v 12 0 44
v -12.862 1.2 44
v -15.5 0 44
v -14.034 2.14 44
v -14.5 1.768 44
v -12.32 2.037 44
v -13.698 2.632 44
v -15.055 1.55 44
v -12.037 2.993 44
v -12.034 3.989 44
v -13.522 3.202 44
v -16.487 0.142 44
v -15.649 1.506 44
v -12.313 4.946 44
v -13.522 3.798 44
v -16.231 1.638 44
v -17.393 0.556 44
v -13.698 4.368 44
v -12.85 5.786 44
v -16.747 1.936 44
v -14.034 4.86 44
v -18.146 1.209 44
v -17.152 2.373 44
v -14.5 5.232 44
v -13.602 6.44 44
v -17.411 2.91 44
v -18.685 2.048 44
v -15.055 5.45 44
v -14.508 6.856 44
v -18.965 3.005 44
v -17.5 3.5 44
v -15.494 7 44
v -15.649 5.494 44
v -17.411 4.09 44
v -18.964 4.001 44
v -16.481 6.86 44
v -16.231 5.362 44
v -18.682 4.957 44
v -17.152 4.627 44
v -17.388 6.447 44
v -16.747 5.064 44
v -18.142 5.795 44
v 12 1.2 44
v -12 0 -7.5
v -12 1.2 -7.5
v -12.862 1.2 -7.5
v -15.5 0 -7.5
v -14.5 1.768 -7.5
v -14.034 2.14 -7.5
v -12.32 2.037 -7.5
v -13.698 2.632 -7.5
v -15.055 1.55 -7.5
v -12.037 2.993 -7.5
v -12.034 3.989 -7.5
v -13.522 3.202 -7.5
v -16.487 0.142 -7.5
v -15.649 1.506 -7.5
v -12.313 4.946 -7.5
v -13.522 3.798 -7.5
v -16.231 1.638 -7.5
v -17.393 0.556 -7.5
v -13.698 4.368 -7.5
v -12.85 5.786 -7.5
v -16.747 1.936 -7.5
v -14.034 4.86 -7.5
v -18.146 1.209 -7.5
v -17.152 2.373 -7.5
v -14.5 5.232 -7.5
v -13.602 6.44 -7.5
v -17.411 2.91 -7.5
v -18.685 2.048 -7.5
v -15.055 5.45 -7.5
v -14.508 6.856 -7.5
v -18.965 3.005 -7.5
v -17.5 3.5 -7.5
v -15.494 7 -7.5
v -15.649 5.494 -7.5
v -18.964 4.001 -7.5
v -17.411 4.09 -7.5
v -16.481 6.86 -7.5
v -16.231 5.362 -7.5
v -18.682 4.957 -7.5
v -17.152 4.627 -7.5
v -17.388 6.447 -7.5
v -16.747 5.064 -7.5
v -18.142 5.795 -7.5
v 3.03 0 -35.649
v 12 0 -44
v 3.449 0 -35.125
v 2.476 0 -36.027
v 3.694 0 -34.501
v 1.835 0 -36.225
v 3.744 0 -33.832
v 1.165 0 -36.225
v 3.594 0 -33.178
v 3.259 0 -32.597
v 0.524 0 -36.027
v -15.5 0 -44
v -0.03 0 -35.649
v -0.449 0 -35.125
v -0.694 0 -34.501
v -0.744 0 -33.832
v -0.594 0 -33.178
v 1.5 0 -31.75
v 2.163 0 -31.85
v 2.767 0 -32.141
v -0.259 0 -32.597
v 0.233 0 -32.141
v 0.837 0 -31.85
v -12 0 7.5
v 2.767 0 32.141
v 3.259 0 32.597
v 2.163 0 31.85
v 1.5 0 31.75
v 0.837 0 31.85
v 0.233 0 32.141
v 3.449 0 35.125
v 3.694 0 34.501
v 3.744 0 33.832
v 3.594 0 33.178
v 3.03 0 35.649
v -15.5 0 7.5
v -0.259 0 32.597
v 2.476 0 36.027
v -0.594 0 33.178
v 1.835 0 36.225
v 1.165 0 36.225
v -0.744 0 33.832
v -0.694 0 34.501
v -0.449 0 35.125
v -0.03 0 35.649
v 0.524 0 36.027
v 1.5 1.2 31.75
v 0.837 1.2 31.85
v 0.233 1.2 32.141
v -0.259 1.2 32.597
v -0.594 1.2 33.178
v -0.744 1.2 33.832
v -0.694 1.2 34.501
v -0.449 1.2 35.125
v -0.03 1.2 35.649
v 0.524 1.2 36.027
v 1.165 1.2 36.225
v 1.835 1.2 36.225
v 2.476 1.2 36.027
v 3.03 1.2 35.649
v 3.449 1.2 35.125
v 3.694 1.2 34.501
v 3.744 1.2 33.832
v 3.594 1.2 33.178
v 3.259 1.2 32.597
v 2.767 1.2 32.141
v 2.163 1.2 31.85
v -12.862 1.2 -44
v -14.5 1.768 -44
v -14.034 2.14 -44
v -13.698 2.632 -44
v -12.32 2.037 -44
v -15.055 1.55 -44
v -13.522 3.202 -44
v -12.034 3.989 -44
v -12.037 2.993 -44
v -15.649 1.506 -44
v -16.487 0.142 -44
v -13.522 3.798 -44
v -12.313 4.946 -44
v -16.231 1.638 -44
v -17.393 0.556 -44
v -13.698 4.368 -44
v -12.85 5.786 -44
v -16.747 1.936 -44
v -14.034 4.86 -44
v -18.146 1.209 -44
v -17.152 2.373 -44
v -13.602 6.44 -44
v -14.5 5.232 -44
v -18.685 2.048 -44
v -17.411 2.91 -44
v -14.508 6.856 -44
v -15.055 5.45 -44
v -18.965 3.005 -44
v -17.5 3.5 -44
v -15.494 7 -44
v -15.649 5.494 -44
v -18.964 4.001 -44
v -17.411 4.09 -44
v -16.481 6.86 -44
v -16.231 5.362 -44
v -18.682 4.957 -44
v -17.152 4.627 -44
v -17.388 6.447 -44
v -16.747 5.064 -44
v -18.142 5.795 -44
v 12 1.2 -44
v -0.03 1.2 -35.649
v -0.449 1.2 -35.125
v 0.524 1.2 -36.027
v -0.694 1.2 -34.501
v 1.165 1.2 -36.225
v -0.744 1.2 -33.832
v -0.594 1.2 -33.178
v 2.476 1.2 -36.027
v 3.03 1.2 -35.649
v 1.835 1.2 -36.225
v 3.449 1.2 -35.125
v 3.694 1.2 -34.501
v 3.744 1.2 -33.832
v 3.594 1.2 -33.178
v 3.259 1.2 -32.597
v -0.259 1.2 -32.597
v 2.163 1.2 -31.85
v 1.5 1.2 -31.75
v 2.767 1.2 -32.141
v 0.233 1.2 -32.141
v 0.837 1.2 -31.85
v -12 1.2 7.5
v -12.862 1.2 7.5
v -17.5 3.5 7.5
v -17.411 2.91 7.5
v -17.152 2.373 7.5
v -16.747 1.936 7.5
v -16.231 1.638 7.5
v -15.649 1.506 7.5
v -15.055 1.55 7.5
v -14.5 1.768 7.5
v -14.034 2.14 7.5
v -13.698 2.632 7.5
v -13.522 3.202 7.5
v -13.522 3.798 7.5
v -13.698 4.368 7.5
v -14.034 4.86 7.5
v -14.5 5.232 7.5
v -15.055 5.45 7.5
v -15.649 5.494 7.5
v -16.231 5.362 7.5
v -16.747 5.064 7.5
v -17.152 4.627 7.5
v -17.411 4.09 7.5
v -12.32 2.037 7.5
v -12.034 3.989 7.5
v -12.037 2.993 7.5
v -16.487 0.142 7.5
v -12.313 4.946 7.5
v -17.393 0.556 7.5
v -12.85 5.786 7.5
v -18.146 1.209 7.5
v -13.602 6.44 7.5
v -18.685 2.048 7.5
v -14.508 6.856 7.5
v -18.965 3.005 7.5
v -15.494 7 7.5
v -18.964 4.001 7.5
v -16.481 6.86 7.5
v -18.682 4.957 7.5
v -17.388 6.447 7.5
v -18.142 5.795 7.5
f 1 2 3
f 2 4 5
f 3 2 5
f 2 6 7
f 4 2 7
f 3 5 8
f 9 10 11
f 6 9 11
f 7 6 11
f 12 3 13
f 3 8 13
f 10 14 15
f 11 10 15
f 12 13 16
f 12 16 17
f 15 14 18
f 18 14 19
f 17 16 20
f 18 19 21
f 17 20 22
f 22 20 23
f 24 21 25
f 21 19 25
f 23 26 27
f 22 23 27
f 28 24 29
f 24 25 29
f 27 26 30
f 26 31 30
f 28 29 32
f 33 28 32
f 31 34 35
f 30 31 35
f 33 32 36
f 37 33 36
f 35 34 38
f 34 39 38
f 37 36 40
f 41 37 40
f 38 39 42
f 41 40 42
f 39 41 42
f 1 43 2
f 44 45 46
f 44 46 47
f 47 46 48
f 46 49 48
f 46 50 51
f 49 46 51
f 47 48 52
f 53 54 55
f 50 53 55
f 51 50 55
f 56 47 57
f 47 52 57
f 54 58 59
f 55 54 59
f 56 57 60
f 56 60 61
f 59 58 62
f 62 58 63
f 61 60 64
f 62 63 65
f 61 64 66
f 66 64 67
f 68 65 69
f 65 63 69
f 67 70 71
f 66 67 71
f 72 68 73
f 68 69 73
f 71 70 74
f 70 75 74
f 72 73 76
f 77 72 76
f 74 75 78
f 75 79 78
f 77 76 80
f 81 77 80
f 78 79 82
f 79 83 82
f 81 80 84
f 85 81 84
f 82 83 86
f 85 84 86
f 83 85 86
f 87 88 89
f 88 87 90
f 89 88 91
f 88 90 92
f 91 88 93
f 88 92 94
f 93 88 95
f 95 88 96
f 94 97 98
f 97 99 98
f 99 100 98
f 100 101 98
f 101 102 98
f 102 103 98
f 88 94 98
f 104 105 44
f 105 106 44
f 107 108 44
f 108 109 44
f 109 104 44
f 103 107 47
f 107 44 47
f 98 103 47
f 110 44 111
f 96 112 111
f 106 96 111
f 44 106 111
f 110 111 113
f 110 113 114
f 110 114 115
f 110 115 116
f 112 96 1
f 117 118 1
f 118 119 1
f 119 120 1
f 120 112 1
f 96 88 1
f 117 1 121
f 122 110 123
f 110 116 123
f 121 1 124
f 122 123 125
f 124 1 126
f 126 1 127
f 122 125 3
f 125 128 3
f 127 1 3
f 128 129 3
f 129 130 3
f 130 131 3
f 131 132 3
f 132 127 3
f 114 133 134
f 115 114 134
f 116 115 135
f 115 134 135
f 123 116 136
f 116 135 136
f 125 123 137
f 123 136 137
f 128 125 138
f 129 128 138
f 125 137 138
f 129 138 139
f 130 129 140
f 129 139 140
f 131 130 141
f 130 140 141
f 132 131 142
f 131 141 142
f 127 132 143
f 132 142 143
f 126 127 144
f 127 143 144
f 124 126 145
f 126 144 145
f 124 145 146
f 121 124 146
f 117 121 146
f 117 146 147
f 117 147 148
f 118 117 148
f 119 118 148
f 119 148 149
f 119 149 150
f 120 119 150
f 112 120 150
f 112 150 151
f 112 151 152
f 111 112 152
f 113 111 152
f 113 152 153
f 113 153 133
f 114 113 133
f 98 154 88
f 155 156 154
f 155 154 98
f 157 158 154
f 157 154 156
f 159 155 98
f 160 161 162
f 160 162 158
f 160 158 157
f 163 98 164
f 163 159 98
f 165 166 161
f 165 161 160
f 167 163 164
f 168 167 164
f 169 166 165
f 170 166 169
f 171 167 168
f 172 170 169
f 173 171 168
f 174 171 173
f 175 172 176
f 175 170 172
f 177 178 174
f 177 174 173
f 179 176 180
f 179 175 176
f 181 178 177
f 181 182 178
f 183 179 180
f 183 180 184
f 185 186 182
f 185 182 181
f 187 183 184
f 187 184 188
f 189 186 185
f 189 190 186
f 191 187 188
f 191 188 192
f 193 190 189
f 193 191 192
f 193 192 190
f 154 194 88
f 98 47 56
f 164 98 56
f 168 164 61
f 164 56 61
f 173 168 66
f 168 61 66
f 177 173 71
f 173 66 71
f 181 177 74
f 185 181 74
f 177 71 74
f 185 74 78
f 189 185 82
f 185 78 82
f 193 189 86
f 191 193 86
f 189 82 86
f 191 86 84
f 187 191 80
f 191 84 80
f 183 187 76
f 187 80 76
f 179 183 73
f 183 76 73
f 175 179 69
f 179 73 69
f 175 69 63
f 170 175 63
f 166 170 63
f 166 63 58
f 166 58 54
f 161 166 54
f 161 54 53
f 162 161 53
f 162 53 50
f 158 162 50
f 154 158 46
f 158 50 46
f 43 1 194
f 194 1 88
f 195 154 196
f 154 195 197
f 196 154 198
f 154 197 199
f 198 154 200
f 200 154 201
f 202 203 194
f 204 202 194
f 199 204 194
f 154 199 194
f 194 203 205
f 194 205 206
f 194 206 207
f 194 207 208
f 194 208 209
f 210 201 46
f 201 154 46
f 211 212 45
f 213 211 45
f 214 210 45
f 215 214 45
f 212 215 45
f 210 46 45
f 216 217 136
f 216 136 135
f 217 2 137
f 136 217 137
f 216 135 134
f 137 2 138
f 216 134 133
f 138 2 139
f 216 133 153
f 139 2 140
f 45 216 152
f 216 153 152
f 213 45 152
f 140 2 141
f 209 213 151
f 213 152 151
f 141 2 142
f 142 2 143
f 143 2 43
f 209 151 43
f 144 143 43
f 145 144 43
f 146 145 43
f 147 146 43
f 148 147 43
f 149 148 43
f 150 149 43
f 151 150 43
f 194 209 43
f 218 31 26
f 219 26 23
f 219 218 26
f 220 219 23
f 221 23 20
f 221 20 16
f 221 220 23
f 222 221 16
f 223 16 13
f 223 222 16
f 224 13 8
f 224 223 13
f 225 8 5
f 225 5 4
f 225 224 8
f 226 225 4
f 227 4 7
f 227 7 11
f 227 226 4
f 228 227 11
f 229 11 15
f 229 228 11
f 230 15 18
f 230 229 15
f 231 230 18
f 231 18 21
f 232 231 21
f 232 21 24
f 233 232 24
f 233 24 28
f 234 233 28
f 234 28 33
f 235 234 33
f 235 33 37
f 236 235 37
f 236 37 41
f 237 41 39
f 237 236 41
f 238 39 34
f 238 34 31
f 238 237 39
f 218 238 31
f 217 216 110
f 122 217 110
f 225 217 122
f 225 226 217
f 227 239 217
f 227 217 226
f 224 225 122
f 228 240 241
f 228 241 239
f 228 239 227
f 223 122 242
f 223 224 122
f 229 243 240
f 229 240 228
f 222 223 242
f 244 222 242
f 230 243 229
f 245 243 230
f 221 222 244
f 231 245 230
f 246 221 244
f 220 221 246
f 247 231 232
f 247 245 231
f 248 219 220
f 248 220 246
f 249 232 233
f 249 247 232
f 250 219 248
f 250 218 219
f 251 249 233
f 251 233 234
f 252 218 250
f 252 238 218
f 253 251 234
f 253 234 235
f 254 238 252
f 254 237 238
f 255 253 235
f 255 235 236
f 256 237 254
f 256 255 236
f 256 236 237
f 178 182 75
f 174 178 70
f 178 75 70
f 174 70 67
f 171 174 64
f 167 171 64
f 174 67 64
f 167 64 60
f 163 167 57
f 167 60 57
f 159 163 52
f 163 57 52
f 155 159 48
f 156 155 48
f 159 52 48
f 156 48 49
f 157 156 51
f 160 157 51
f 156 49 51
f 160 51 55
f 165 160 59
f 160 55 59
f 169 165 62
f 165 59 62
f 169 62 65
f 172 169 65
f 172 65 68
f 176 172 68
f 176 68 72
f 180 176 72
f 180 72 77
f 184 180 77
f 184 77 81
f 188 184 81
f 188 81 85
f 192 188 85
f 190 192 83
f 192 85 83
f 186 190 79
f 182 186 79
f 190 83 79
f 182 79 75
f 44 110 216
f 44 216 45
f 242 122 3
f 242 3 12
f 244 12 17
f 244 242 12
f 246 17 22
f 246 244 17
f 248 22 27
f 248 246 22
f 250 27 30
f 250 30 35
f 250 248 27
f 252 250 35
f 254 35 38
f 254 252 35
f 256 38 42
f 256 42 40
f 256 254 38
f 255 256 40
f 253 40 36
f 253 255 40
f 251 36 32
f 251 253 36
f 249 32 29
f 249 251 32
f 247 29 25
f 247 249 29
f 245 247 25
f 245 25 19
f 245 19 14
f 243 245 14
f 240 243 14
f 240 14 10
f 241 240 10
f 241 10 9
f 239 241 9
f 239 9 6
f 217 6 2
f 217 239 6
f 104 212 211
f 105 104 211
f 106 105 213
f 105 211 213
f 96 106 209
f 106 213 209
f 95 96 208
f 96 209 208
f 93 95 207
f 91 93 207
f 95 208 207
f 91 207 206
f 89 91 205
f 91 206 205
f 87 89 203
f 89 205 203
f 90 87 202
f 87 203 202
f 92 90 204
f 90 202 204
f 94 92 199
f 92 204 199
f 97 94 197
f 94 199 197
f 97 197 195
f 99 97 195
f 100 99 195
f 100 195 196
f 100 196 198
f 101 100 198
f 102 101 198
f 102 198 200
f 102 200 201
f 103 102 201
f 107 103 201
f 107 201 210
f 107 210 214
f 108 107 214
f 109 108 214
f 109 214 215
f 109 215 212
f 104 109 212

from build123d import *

# Parameters (mm, degrees)
SKETCH1_W           = 24
SKETCH1_H           = 88
BOSS_EXTRUDE1_DEPTH = 1.2
BOSS_EXTRUDE2_START = 7.5
SKETCH2_R           = 2
BOSS_EXTRUDE2_DEPTH = 36.5
SKETCH4_R           = 2.25
CUT_EXTRUDE2_DEPTH  = 49.276702456


with BuildPart() as part:
    # Sketch1 → Boss-Extrude1 (new body)
    with BuildSketch(Plane(origin=(0, 0, 0), x_dir=(1, 0, 0), z_dir=(0, 1, 0))):
        Rectangle(SKETCH1_W, SKETCH1_H)
    extrude(amount=BOSS_EXTRUDE1_DEPTH)

    # Sketch2 → Boss-Extrude2 (add)
    with BuildSketch(Plane.XY.offset(BOSS_EXTRUDE2_START)):
        with BuildLine():
            Line((-12, 0), (-15.5, 0))
            ThreePointArc((-15.5, 0), (-16.949137675, 6.685906464), (-12.861818808, 1.2))
            Line((-12.861818808, 1.2), (-12, 1.2))
            Line((-12, 1.2), (-12, 0))
        make_face()
        with Locations(Location((-15.5, 3.5, 0), (0, 0, 180))):
            Circle(SKETCH2_R, mode=Mode.SUBTRACT)
    extrude(amount=BOSS_EXTRUDE2_DEPTH)

    # Mirror4: part across plane


with BuildPart() as part_1:
    add(part.part)
    add(part.part.mirror(Plane.XY))

    # Sketch4 → Cut-Extrude2 (cut, through all)
    with BuildSketch(Plane(origin=(0, 1.2, 0), x_dir=(1, 0, 0), z_dir=(0, 1, 0))):
        with Locations(Location((1.5, 34, 0), (0, 0, 270))):
            Circle(SKETCH4_R)
        with Locations(Location((1.5, -34, 0), (0, 0, 90))):
            Circle(SKETCH4_R)
    extrude(amount=-CUT_EXTRUDE2_DEPTH, mode=Mode.SUBTRACT)


solid = part_1.part
